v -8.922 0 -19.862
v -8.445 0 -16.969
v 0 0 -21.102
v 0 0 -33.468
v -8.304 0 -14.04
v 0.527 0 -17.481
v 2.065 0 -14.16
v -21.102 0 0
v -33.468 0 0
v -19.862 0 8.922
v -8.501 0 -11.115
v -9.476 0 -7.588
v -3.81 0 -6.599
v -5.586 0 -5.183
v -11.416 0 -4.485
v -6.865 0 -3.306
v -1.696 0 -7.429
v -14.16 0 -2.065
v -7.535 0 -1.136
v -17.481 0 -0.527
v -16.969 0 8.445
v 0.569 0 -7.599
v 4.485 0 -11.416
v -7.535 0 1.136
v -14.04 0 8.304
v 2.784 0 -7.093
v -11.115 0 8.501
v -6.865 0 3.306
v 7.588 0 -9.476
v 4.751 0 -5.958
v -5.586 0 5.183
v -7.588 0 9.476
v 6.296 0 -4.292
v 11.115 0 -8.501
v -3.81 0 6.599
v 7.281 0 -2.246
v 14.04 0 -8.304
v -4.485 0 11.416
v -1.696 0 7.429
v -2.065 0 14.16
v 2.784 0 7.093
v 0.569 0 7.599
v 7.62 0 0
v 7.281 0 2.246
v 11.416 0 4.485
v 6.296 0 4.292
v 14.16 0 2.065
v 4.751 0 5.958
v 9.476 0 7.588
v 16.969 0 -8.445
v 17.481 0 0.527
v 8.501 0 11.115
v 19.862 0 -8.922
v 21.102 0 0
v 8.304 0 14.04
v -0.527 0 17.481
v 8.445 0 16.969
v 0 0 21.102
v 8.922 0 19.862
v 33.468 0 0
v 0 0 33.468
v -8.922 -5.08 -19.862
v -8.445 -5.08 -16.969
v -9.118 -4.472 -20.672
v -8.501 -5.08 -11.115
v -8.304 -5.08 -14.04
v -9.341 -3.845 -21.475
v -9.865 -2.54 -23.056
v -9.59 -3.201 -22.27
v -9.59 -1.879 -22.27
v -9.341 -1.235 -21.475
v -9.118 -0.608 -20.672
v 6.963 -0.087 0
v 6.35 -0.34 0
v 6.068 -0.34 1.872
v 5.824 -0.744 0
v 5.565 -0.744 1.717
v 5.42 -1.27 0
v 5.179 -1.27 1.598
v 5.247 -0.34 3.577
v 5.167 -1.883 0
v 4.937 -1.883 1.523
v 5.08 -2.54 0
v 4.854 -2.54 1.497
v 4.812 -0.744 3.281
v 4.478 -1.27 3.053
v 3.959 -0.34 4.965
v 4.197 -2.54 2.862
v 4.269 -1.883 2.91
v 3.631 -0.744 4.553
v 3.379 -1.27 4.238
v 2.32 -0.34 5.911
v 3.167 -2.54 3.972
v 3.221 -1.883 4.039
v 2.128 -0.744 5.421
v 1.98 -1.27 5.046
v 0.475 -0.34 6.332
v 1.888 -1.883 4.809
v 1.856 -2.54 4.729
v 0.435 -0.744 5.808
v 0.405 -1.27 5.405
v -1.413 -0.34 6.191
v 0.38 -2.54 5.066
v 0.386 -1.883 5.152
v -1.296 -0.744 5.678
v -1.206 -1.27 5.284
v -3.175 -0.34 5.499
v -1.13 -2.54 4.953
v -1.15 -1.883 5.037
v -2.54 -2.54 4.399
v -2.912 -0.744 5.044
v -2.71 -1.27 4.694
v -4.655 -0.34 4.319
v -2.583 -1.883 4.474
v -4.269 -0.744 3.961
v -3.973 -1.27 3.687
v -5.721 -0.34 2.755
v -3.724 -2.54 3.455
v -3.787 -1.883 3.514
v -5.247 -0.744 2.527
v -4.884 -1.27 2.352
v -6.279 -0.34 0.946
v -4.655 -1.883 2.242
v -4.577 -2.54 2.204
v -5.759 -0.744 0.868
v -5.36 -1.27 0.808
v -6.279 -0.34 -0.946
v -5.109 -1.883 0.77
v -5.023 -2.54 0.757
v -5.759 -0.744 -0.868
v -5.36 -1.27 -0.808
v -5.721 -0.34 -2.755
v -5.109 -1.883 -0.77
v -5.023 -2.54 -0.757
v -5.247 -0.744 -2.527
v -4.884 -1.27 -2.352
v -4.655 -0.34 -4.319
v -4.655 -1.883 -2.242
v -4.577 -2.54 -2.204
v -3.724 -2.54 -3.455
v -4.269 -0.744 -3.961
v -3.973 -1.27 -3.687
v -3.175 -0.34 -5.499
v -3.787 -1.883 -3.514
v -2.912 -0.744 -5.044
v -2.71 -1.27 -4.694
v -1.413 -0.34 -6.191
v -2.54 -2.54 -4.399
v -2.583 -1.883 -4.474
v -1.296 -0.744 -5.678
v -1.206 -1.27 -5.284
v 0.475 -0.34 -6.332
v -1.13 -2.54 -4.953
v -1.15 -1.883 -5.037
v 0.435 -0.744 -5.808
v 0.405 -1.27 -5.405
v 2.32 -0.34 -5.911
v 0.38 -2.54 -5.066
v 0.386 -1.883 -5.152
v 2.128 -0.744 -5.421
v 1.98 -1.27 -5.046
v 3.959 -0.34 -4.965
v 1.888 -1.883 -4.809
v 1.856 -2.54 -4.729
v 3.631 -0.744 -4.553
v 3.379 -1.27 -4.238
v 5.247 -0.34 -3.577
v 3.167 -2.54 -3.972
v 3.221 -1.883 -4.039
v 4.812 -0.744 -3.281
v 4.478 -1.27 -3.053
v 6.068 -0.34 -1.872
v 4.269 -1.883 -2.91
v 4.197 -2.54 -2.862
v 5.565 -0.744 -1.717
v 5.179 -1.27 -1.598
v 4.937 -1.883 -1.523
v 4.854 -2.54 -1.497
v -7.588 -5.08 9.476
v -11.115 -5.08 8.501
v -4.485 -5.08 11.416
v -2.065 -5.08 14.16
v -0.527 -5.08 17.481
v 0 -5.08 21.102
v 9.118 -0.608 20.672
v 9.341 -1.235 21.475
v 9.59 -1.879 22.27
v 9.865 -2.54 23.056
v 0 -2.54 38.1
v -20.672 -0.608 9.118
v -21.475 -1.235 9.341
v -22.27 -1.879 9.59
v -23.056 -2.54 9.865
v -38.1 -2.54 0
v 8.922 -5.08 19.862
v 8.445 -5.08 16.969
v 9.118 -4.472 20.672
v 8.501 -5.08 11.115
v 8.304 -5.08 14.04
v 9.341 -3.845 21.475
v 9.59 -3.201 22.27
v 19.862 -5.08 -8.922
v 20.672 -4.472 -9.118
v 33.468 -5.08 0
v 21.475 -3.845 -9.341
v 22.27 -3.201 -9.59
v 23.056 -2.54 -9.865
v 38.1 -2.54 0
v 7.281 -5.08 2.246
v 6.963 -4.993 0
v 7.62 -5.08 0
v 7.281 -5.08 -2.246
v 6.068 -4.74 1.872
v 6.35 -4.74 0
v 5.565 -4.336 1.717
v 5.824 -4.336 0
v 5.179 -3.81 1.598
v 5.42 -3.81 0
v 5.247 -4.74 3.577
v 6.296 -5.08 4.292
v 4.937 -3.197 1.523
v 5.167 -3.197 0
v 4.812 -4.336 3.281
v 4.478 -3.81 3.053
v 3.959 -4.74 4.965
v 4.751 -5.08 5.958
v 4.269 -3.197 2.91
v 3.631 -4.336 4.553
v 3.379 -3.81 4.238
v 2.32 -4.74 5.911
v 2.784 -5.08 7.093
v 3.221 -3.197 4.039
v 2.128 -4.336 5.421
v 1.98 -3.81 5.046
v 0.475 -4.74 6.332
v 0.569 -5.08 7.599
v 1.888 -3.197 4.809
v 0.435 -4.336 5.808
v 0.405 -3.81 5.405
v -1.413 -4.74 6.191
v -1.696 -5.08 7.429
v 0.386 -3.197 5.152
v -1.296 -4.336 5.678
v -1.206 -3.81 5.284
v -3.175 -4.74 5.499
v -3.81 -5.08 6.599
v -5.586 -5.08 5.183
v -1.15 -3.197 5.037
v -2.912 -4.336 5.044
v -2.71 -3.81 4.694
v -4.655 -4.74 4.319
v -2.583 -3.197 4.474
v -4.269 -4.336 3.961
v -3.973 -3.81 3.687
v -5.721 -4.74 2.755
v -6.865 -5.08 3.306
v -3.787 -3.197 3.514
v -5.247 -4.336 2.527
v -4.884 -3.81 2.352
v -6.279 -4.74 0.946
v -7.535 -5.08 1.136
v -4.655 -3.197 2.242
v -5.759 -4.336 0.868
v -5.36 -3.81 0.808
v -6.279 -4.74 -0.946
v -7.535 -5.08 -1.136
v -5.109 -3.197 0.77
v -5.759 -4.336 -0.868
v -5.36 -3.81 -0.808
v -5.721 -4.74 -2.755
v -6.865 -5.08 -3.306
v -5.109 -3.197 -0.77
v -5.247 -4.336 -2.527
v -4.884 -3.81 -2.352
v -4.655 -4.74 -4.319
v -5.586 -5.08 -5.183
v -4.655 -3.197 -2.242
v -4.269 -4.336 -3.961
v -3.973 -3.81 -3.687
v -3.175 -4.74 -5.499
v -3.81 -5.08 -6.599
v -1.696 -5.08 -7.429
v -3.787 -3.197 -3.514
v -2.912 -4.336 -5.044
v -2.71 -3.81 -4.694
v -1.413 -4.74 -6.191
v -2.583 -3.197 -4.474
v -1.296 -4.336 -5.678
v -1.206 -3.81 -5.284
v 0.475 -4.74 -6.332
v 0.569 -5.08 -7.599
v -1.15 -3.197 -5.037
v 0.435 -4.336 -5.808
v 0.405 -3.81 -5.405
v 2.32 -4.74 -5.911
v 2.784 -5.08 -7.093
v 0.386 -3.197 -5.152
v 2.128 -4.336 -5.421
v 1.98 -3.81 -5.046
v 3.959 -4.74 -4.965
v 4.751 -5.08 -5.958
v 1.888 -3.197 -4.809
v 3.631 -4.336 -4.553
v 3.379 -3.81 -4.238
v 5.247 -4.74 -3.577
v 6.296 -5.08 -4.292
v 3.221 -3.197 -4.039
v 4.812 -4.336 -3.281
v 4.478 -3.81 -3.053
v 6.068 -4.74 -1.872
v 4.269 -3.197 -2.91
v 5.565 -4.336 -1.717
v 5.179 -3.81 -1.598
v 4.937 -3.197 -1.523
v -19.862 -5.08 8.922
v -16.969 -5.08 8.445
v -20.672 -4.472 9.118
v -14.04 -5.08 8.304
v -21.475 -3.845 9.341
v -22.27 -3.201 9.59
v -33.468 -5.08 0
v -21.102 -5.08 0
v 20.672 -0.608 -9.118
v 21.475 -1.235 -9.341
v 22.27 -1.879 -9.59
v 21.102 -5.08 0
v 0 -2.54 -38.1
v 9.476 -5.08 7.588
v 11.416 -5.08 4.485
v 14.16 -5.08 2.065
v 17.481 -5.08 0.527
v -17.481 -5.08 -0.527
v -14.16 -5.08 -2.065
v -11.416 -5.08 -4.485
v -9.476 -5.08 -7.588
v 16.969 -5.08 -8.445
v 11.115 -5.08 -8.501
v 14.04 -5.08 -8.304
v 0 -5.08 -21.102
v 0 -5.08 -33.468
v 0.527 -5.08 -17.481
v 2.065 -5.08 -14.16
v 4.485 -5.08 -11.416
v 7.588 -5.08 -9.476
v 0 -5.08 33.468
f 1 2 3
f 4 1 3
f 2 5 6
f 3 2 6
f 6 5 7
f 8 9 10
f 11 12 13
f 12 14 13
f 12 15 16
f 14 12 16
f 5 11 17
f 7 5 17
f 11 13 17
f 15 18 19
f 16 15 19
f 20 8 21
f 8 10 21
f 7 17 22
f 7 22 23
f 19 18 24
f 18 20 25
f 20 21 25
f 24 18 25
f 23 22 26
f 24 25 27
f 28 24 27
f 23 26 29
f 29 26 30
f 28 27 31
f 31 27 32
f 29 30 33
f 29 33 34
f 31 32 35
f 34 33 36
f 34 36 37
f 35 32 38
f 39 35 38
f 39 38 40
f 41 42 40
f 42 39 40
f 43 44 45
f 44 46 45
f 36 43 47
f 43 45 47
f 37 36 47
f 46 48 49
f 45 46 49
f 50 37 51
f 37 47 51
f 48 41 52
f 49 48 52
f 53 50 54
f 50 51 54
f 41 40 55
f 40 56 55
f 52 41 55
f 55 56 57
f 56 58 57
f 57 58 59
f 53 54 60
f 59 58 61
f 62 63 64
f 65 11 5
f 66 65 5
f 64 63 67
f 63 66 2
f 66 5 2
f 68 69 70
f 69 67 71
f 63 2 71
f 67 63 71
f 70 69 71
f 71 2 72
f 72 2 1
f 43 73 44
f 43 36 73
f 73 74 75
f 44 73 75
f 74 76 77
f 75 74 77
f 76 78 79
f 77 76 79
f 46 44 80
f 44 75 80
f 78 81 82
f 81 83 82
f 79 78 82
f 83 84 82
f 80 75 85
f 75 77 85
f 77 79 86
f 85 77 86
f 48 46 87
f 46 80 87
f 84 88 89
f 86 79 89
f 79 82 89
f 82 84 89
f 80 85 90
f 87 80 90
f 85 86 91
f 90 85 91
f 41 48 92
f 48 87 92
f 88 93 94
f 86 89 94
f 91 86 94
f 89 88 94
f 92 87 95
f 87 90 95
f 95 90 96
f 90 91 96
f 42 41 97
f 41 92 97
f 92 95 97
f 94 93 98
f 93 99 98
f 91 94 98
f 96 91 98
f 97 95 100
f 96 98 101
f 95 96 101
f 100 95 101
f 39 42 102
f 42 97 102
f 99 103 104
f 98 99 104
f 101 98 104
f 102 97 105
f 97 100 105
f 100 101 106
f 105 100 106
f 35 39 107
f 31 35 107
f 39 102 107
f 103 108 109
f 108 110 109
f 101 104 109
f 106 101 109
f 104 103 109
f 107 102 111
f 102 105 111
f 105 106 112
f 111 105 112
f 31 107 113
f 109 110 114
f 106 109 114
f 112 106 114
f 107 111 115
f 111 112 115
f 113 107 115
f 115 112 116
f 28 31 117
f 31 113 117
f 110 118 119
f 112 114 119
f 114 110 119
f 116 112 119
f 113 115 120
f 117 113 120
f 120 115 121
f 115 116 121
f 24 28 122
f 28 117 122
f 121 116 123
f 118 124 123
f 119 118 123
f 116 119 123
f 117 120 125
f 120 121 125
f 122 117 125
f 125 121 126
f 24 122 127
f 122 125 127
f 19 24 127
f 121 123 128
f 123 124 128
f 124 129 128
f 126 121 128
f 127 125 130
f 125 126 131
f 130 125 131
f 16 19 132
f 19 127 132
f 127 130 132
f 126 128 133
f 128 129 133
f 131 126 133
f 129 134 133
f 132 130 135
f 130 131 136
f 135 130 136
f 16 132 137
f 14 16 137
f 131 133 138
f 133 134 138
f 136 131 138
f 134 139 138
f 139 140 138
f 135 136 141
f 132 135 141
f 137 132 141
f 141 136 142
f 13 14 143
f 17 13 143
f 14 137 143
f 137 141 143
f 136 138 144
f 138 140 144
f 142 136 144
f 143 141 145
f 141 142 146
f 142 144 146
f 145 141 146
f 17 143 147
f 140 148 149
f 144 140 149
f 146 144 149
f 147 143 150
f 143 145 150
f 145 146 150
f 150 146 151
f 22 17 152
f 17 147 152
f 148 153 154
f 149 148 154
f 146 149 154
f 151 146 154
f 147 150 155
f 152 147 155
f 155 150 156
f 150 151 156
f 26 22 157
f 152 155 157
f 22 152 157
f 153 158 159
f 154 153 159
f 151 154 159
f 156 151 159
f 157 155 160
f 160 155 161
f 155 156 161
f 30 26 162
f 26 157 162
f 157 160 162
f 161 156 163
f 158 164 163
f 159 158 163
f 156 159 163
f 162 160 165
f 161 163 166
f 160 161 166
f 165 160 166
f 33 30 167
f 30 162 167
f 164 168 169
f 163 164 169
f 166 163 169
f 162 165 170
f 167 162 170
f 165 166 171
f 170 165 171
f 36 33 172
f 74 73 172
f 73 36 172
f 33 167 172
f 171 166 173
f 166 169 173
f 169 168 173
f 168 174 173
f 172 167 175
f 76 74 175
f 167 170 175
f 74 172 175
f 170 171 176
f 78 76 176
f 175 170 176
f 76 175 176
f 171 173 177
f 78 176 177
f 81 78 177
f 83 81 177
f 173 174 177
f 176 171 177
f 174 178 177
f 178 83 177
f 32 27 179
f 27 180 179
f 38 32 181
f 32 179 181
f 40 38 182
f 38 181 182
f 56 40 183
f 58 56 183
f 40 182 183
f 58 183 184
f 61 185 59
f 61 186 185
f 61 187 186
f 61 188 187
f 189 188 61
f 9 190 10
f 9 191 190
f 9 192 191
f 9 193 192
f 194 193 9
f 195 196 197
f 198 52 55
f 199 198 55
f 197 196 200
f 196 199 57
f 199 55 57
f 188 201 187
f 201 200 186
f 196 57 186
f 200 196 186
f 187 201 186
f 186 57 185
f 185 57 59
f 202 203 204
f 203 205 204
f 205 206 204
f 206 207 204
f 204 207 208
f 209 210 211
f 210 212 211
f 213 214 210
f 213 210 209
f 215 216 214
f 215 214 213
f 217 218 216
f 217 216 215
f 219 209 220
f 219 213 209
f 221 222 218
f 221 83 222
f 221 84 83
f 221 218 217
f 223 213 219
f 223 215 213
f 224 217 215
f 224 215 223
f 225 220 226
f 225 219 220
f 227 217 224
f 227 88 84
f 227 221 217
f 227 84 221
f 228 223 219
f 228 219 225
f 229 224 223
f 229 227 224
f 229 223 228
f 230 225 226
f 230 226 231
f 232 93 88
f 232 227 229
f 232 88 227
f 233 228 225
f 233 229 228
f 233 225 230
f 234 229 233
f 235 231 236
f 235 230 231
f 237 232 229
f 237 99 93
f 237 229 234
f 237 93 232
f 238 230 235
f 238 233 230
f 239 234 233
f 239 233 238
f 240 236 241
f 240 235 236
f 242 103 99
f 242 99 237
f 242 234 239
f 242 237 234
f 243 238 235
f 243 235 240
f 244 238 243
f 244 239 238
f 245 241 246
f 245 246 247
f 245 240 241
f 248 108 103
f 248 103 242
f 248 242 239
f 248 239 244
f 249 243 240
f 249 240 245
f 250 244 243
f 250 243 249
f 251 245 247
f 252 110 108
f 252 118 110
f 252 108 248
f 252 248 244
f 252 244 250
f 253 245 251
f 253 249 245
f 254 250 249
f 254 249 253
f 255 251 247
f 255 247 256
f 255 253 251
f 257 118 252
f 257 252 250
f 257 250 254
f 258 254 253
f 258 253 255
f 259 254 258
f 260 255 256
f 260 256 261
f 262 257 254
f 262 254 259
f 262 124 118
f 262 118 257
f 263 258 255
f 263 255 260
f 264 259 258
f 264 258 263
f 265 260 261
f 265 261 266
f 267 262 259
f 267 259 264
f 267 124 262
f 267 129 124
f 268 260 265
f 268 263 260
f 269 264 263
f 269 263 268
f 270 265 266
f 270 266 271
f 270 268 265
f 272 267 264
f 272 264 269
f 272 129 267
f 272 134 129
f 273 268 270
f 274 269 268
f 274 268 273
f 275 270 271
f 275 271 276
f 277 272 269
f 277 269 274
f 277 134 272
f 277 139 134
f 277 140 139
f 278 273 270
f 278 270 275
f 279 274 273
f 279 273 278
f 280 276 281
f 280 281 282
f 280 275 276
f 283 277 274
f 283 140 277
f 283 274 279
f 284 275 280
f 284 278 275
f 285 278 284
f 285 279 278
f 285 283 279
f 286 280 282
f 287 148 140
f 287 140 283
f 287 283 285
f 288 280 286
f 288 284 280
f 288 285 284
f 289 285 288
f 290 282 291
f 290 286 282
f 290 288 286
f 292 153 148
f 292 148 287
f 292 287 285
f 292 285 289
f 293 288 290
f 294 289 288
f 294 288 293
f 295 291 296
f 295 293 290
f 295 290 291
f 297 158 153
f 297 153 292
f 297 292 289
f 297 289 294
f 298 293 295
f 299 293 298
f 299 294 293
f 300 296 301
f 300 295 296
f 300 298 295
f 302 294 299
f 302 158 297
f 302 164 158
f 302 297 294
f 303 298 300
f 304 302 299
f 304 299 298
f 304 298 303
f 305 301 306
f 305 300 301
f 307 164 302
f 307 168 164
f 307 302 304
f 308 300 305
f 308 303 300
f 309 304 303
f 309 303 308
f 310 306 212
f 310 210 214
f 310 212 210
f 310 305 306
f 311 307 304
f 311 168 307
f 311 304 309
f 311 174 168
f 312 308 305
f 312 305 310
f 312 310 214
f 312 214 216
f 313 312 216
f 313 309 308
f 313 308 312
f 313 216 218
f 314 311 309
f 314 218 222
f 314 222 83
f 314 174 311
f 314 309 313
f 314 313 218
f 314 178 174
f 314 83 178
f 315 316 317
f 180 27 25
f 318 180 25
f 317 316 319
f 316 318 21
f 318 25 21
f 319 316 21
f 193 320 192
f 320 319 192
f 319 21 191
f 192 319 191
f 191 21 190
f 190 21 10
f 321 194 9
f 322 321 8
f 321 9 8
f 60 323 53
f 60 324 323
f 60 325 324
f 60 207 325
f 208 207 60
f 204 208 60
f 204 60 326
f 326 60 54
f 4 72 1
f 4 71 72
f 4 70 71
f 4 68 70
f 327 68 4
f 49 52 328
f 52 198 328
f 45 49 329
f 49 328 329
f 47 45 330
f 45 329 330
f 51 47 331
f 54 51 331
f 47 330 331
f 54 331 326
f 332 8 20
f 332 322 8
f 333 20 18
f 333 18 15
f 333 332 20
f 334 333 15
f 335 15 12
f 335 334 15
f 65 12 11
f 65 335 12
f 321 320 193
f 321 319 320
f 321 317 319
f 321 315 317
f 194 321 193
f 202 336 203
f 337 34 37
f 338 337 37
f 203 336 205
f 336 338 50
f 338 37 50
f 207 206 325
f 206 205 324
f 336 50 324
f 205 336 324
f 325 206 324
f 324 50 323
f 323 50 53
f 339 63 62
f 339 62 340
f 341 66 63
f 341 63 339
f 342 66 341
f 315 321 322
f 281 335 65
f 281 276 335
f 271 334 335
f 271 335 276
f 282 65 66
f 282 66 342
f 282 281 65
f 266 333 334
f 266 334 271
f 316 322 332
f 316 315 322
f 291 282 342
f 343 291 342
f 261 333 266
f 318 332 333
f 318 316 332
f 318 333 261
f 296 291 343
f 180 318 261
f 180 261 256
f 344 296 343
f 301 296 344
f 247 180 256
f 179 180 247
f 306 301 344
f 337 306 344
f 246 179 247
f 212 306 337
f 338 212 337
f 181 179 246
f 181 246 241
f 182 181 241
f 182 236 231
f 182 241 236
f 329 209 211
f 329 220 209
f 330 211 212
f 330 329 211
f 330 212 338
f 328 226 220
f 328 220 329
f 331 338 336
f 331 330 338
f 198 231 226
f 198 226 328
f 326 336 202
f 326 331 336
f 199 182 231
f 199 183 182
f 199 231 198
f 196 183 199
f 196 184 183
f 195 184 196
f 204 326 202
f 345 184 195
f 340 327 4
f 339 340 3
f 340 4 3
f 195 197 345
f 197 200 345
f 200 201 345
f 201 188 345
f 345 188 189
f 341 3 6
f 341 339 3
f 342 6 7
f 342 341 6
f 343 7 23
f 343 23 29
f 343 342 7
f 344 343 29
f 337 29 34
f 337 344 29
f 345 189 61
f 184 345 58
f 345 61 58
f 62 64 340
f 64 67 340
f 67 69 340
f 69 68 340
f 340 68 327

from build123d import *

# Parameters (mm, degrees)
F1_DEPTH = 5.08
F2_R     = 5.08
F3_DEPTH = 25.4
F4_R     = 12.7
F5_SIZE  = 2.53999
F6_R     = 2.53999


# Not quite as in the source:
# - a fillet or chamfer is up to 0.001 mm smaller than in the source, because OpenCascade refuses the exact size


with BuildPart() as f1:
    # F0 (on Front) → F1 (new body)
    with BuildSketch(Plane.XZ):
        with BuildLine():
            Line((-12.7, 0), (0, 0))
            Line((0, 0), (0, 12.7))
            ThreePointArc((0, 12.7), (-11.1850810666, 8.4922018267), (-23.0563643922, 9.8648766371))
            Line((-23.0563643922, 9.8648766371), (-38.1, 0))
            Line((-38.1, 0), (-12.7, 0))
        make_face()
        with BuildLine():
            Line((0, 12.7), (0, 0))
            Line((0, 0), (12.7, 0))
            ThreePointArc((12.7, 0), (8.4922018267, 11.1850810666), (9.8648766371, 23.0563643922))
            Line((9.8648766371, 23.0563643922), (0, 38.1))
            Line((0, 38.1), (0, 12.7))
        make_face()
        with BuildLine():
            Line((0, -12.7), (0, 0))
            Line((0, 0), (-12.7, 0))
            ThreePointArc((-12.7, 0), (-8.4922018267, -11.1850810666), (-9.8648766371, -23.0563643922))
            Line((-9.8648766371, -23.0563643922), (0, -38.1))
            Line((0, -38.1), (0, -12.7))
        make_face()
        with BuildLine():
            Line((12.7, 0), (0, 0))
            Line((0, 0), (0, -12.7))
            ThreePointArc((0, -12.7), (11.1850810666, -8.4922018267), (23.0563643922, -9.8648766371))
            Line((23.0563643922, -9.8648766371), (38.1, 0))
            Line((38.1, 0), (12.7, 0))
        make_face()
    extrude(amount=F1_DEPTH)

    # F2 (on face) → F3 (cut)
    with BuildSketch(Plane.XZ.offset(5.08)):
        Circle(F2_R)
    extrude(amount=-F3_DEPTH, mode=Mode.SUBTRACT)

    # F4
    f4_edges = [f1.edges().sort_by_distance(p)[0] for p in [
        (0, -2.54, 12.7),
        (12.7, -2.54, 0),
        (0, -2.54, -12.7),
        (-12.7, -2.54, 0),
    ]]
    fillet(f4_edges, radius=F4_R)

    # F5 (size 2.54 in the source; OpenCascade refuses exactly that, so slightly less here)
    f5_edges = [f1.edges().sort_by_distance(p)[0] for p in [
        (30.578182, 0, -4.932438),
        (30.578182, -5.08, -4.932438),
        (4.932438, 0, 30.578182),
        (4.932438, -5.08, 30.578182),
        (-4.932438, 0, -30.578182),
        (-4.932438, -5.08, -30.578182),
        (-30.578182, 0, 4.932438),
        (-30.578182, -5.08, 4.932438),
    ]]
    chamfer(f5_edges, length=F5_SIZE)

    # F6 (radius 2.54 in the source; OpenCascade refuses exactly that, so slightly less here)
    f6_edges = [f1.edges().sort_by_distance(p)[0] for p in [
        (-5.08, 0, 0),
        (-5.08, -5.08, 0),
    ]]
    fillet(f6_edges, radius=F6_R)


solid = f1.part
